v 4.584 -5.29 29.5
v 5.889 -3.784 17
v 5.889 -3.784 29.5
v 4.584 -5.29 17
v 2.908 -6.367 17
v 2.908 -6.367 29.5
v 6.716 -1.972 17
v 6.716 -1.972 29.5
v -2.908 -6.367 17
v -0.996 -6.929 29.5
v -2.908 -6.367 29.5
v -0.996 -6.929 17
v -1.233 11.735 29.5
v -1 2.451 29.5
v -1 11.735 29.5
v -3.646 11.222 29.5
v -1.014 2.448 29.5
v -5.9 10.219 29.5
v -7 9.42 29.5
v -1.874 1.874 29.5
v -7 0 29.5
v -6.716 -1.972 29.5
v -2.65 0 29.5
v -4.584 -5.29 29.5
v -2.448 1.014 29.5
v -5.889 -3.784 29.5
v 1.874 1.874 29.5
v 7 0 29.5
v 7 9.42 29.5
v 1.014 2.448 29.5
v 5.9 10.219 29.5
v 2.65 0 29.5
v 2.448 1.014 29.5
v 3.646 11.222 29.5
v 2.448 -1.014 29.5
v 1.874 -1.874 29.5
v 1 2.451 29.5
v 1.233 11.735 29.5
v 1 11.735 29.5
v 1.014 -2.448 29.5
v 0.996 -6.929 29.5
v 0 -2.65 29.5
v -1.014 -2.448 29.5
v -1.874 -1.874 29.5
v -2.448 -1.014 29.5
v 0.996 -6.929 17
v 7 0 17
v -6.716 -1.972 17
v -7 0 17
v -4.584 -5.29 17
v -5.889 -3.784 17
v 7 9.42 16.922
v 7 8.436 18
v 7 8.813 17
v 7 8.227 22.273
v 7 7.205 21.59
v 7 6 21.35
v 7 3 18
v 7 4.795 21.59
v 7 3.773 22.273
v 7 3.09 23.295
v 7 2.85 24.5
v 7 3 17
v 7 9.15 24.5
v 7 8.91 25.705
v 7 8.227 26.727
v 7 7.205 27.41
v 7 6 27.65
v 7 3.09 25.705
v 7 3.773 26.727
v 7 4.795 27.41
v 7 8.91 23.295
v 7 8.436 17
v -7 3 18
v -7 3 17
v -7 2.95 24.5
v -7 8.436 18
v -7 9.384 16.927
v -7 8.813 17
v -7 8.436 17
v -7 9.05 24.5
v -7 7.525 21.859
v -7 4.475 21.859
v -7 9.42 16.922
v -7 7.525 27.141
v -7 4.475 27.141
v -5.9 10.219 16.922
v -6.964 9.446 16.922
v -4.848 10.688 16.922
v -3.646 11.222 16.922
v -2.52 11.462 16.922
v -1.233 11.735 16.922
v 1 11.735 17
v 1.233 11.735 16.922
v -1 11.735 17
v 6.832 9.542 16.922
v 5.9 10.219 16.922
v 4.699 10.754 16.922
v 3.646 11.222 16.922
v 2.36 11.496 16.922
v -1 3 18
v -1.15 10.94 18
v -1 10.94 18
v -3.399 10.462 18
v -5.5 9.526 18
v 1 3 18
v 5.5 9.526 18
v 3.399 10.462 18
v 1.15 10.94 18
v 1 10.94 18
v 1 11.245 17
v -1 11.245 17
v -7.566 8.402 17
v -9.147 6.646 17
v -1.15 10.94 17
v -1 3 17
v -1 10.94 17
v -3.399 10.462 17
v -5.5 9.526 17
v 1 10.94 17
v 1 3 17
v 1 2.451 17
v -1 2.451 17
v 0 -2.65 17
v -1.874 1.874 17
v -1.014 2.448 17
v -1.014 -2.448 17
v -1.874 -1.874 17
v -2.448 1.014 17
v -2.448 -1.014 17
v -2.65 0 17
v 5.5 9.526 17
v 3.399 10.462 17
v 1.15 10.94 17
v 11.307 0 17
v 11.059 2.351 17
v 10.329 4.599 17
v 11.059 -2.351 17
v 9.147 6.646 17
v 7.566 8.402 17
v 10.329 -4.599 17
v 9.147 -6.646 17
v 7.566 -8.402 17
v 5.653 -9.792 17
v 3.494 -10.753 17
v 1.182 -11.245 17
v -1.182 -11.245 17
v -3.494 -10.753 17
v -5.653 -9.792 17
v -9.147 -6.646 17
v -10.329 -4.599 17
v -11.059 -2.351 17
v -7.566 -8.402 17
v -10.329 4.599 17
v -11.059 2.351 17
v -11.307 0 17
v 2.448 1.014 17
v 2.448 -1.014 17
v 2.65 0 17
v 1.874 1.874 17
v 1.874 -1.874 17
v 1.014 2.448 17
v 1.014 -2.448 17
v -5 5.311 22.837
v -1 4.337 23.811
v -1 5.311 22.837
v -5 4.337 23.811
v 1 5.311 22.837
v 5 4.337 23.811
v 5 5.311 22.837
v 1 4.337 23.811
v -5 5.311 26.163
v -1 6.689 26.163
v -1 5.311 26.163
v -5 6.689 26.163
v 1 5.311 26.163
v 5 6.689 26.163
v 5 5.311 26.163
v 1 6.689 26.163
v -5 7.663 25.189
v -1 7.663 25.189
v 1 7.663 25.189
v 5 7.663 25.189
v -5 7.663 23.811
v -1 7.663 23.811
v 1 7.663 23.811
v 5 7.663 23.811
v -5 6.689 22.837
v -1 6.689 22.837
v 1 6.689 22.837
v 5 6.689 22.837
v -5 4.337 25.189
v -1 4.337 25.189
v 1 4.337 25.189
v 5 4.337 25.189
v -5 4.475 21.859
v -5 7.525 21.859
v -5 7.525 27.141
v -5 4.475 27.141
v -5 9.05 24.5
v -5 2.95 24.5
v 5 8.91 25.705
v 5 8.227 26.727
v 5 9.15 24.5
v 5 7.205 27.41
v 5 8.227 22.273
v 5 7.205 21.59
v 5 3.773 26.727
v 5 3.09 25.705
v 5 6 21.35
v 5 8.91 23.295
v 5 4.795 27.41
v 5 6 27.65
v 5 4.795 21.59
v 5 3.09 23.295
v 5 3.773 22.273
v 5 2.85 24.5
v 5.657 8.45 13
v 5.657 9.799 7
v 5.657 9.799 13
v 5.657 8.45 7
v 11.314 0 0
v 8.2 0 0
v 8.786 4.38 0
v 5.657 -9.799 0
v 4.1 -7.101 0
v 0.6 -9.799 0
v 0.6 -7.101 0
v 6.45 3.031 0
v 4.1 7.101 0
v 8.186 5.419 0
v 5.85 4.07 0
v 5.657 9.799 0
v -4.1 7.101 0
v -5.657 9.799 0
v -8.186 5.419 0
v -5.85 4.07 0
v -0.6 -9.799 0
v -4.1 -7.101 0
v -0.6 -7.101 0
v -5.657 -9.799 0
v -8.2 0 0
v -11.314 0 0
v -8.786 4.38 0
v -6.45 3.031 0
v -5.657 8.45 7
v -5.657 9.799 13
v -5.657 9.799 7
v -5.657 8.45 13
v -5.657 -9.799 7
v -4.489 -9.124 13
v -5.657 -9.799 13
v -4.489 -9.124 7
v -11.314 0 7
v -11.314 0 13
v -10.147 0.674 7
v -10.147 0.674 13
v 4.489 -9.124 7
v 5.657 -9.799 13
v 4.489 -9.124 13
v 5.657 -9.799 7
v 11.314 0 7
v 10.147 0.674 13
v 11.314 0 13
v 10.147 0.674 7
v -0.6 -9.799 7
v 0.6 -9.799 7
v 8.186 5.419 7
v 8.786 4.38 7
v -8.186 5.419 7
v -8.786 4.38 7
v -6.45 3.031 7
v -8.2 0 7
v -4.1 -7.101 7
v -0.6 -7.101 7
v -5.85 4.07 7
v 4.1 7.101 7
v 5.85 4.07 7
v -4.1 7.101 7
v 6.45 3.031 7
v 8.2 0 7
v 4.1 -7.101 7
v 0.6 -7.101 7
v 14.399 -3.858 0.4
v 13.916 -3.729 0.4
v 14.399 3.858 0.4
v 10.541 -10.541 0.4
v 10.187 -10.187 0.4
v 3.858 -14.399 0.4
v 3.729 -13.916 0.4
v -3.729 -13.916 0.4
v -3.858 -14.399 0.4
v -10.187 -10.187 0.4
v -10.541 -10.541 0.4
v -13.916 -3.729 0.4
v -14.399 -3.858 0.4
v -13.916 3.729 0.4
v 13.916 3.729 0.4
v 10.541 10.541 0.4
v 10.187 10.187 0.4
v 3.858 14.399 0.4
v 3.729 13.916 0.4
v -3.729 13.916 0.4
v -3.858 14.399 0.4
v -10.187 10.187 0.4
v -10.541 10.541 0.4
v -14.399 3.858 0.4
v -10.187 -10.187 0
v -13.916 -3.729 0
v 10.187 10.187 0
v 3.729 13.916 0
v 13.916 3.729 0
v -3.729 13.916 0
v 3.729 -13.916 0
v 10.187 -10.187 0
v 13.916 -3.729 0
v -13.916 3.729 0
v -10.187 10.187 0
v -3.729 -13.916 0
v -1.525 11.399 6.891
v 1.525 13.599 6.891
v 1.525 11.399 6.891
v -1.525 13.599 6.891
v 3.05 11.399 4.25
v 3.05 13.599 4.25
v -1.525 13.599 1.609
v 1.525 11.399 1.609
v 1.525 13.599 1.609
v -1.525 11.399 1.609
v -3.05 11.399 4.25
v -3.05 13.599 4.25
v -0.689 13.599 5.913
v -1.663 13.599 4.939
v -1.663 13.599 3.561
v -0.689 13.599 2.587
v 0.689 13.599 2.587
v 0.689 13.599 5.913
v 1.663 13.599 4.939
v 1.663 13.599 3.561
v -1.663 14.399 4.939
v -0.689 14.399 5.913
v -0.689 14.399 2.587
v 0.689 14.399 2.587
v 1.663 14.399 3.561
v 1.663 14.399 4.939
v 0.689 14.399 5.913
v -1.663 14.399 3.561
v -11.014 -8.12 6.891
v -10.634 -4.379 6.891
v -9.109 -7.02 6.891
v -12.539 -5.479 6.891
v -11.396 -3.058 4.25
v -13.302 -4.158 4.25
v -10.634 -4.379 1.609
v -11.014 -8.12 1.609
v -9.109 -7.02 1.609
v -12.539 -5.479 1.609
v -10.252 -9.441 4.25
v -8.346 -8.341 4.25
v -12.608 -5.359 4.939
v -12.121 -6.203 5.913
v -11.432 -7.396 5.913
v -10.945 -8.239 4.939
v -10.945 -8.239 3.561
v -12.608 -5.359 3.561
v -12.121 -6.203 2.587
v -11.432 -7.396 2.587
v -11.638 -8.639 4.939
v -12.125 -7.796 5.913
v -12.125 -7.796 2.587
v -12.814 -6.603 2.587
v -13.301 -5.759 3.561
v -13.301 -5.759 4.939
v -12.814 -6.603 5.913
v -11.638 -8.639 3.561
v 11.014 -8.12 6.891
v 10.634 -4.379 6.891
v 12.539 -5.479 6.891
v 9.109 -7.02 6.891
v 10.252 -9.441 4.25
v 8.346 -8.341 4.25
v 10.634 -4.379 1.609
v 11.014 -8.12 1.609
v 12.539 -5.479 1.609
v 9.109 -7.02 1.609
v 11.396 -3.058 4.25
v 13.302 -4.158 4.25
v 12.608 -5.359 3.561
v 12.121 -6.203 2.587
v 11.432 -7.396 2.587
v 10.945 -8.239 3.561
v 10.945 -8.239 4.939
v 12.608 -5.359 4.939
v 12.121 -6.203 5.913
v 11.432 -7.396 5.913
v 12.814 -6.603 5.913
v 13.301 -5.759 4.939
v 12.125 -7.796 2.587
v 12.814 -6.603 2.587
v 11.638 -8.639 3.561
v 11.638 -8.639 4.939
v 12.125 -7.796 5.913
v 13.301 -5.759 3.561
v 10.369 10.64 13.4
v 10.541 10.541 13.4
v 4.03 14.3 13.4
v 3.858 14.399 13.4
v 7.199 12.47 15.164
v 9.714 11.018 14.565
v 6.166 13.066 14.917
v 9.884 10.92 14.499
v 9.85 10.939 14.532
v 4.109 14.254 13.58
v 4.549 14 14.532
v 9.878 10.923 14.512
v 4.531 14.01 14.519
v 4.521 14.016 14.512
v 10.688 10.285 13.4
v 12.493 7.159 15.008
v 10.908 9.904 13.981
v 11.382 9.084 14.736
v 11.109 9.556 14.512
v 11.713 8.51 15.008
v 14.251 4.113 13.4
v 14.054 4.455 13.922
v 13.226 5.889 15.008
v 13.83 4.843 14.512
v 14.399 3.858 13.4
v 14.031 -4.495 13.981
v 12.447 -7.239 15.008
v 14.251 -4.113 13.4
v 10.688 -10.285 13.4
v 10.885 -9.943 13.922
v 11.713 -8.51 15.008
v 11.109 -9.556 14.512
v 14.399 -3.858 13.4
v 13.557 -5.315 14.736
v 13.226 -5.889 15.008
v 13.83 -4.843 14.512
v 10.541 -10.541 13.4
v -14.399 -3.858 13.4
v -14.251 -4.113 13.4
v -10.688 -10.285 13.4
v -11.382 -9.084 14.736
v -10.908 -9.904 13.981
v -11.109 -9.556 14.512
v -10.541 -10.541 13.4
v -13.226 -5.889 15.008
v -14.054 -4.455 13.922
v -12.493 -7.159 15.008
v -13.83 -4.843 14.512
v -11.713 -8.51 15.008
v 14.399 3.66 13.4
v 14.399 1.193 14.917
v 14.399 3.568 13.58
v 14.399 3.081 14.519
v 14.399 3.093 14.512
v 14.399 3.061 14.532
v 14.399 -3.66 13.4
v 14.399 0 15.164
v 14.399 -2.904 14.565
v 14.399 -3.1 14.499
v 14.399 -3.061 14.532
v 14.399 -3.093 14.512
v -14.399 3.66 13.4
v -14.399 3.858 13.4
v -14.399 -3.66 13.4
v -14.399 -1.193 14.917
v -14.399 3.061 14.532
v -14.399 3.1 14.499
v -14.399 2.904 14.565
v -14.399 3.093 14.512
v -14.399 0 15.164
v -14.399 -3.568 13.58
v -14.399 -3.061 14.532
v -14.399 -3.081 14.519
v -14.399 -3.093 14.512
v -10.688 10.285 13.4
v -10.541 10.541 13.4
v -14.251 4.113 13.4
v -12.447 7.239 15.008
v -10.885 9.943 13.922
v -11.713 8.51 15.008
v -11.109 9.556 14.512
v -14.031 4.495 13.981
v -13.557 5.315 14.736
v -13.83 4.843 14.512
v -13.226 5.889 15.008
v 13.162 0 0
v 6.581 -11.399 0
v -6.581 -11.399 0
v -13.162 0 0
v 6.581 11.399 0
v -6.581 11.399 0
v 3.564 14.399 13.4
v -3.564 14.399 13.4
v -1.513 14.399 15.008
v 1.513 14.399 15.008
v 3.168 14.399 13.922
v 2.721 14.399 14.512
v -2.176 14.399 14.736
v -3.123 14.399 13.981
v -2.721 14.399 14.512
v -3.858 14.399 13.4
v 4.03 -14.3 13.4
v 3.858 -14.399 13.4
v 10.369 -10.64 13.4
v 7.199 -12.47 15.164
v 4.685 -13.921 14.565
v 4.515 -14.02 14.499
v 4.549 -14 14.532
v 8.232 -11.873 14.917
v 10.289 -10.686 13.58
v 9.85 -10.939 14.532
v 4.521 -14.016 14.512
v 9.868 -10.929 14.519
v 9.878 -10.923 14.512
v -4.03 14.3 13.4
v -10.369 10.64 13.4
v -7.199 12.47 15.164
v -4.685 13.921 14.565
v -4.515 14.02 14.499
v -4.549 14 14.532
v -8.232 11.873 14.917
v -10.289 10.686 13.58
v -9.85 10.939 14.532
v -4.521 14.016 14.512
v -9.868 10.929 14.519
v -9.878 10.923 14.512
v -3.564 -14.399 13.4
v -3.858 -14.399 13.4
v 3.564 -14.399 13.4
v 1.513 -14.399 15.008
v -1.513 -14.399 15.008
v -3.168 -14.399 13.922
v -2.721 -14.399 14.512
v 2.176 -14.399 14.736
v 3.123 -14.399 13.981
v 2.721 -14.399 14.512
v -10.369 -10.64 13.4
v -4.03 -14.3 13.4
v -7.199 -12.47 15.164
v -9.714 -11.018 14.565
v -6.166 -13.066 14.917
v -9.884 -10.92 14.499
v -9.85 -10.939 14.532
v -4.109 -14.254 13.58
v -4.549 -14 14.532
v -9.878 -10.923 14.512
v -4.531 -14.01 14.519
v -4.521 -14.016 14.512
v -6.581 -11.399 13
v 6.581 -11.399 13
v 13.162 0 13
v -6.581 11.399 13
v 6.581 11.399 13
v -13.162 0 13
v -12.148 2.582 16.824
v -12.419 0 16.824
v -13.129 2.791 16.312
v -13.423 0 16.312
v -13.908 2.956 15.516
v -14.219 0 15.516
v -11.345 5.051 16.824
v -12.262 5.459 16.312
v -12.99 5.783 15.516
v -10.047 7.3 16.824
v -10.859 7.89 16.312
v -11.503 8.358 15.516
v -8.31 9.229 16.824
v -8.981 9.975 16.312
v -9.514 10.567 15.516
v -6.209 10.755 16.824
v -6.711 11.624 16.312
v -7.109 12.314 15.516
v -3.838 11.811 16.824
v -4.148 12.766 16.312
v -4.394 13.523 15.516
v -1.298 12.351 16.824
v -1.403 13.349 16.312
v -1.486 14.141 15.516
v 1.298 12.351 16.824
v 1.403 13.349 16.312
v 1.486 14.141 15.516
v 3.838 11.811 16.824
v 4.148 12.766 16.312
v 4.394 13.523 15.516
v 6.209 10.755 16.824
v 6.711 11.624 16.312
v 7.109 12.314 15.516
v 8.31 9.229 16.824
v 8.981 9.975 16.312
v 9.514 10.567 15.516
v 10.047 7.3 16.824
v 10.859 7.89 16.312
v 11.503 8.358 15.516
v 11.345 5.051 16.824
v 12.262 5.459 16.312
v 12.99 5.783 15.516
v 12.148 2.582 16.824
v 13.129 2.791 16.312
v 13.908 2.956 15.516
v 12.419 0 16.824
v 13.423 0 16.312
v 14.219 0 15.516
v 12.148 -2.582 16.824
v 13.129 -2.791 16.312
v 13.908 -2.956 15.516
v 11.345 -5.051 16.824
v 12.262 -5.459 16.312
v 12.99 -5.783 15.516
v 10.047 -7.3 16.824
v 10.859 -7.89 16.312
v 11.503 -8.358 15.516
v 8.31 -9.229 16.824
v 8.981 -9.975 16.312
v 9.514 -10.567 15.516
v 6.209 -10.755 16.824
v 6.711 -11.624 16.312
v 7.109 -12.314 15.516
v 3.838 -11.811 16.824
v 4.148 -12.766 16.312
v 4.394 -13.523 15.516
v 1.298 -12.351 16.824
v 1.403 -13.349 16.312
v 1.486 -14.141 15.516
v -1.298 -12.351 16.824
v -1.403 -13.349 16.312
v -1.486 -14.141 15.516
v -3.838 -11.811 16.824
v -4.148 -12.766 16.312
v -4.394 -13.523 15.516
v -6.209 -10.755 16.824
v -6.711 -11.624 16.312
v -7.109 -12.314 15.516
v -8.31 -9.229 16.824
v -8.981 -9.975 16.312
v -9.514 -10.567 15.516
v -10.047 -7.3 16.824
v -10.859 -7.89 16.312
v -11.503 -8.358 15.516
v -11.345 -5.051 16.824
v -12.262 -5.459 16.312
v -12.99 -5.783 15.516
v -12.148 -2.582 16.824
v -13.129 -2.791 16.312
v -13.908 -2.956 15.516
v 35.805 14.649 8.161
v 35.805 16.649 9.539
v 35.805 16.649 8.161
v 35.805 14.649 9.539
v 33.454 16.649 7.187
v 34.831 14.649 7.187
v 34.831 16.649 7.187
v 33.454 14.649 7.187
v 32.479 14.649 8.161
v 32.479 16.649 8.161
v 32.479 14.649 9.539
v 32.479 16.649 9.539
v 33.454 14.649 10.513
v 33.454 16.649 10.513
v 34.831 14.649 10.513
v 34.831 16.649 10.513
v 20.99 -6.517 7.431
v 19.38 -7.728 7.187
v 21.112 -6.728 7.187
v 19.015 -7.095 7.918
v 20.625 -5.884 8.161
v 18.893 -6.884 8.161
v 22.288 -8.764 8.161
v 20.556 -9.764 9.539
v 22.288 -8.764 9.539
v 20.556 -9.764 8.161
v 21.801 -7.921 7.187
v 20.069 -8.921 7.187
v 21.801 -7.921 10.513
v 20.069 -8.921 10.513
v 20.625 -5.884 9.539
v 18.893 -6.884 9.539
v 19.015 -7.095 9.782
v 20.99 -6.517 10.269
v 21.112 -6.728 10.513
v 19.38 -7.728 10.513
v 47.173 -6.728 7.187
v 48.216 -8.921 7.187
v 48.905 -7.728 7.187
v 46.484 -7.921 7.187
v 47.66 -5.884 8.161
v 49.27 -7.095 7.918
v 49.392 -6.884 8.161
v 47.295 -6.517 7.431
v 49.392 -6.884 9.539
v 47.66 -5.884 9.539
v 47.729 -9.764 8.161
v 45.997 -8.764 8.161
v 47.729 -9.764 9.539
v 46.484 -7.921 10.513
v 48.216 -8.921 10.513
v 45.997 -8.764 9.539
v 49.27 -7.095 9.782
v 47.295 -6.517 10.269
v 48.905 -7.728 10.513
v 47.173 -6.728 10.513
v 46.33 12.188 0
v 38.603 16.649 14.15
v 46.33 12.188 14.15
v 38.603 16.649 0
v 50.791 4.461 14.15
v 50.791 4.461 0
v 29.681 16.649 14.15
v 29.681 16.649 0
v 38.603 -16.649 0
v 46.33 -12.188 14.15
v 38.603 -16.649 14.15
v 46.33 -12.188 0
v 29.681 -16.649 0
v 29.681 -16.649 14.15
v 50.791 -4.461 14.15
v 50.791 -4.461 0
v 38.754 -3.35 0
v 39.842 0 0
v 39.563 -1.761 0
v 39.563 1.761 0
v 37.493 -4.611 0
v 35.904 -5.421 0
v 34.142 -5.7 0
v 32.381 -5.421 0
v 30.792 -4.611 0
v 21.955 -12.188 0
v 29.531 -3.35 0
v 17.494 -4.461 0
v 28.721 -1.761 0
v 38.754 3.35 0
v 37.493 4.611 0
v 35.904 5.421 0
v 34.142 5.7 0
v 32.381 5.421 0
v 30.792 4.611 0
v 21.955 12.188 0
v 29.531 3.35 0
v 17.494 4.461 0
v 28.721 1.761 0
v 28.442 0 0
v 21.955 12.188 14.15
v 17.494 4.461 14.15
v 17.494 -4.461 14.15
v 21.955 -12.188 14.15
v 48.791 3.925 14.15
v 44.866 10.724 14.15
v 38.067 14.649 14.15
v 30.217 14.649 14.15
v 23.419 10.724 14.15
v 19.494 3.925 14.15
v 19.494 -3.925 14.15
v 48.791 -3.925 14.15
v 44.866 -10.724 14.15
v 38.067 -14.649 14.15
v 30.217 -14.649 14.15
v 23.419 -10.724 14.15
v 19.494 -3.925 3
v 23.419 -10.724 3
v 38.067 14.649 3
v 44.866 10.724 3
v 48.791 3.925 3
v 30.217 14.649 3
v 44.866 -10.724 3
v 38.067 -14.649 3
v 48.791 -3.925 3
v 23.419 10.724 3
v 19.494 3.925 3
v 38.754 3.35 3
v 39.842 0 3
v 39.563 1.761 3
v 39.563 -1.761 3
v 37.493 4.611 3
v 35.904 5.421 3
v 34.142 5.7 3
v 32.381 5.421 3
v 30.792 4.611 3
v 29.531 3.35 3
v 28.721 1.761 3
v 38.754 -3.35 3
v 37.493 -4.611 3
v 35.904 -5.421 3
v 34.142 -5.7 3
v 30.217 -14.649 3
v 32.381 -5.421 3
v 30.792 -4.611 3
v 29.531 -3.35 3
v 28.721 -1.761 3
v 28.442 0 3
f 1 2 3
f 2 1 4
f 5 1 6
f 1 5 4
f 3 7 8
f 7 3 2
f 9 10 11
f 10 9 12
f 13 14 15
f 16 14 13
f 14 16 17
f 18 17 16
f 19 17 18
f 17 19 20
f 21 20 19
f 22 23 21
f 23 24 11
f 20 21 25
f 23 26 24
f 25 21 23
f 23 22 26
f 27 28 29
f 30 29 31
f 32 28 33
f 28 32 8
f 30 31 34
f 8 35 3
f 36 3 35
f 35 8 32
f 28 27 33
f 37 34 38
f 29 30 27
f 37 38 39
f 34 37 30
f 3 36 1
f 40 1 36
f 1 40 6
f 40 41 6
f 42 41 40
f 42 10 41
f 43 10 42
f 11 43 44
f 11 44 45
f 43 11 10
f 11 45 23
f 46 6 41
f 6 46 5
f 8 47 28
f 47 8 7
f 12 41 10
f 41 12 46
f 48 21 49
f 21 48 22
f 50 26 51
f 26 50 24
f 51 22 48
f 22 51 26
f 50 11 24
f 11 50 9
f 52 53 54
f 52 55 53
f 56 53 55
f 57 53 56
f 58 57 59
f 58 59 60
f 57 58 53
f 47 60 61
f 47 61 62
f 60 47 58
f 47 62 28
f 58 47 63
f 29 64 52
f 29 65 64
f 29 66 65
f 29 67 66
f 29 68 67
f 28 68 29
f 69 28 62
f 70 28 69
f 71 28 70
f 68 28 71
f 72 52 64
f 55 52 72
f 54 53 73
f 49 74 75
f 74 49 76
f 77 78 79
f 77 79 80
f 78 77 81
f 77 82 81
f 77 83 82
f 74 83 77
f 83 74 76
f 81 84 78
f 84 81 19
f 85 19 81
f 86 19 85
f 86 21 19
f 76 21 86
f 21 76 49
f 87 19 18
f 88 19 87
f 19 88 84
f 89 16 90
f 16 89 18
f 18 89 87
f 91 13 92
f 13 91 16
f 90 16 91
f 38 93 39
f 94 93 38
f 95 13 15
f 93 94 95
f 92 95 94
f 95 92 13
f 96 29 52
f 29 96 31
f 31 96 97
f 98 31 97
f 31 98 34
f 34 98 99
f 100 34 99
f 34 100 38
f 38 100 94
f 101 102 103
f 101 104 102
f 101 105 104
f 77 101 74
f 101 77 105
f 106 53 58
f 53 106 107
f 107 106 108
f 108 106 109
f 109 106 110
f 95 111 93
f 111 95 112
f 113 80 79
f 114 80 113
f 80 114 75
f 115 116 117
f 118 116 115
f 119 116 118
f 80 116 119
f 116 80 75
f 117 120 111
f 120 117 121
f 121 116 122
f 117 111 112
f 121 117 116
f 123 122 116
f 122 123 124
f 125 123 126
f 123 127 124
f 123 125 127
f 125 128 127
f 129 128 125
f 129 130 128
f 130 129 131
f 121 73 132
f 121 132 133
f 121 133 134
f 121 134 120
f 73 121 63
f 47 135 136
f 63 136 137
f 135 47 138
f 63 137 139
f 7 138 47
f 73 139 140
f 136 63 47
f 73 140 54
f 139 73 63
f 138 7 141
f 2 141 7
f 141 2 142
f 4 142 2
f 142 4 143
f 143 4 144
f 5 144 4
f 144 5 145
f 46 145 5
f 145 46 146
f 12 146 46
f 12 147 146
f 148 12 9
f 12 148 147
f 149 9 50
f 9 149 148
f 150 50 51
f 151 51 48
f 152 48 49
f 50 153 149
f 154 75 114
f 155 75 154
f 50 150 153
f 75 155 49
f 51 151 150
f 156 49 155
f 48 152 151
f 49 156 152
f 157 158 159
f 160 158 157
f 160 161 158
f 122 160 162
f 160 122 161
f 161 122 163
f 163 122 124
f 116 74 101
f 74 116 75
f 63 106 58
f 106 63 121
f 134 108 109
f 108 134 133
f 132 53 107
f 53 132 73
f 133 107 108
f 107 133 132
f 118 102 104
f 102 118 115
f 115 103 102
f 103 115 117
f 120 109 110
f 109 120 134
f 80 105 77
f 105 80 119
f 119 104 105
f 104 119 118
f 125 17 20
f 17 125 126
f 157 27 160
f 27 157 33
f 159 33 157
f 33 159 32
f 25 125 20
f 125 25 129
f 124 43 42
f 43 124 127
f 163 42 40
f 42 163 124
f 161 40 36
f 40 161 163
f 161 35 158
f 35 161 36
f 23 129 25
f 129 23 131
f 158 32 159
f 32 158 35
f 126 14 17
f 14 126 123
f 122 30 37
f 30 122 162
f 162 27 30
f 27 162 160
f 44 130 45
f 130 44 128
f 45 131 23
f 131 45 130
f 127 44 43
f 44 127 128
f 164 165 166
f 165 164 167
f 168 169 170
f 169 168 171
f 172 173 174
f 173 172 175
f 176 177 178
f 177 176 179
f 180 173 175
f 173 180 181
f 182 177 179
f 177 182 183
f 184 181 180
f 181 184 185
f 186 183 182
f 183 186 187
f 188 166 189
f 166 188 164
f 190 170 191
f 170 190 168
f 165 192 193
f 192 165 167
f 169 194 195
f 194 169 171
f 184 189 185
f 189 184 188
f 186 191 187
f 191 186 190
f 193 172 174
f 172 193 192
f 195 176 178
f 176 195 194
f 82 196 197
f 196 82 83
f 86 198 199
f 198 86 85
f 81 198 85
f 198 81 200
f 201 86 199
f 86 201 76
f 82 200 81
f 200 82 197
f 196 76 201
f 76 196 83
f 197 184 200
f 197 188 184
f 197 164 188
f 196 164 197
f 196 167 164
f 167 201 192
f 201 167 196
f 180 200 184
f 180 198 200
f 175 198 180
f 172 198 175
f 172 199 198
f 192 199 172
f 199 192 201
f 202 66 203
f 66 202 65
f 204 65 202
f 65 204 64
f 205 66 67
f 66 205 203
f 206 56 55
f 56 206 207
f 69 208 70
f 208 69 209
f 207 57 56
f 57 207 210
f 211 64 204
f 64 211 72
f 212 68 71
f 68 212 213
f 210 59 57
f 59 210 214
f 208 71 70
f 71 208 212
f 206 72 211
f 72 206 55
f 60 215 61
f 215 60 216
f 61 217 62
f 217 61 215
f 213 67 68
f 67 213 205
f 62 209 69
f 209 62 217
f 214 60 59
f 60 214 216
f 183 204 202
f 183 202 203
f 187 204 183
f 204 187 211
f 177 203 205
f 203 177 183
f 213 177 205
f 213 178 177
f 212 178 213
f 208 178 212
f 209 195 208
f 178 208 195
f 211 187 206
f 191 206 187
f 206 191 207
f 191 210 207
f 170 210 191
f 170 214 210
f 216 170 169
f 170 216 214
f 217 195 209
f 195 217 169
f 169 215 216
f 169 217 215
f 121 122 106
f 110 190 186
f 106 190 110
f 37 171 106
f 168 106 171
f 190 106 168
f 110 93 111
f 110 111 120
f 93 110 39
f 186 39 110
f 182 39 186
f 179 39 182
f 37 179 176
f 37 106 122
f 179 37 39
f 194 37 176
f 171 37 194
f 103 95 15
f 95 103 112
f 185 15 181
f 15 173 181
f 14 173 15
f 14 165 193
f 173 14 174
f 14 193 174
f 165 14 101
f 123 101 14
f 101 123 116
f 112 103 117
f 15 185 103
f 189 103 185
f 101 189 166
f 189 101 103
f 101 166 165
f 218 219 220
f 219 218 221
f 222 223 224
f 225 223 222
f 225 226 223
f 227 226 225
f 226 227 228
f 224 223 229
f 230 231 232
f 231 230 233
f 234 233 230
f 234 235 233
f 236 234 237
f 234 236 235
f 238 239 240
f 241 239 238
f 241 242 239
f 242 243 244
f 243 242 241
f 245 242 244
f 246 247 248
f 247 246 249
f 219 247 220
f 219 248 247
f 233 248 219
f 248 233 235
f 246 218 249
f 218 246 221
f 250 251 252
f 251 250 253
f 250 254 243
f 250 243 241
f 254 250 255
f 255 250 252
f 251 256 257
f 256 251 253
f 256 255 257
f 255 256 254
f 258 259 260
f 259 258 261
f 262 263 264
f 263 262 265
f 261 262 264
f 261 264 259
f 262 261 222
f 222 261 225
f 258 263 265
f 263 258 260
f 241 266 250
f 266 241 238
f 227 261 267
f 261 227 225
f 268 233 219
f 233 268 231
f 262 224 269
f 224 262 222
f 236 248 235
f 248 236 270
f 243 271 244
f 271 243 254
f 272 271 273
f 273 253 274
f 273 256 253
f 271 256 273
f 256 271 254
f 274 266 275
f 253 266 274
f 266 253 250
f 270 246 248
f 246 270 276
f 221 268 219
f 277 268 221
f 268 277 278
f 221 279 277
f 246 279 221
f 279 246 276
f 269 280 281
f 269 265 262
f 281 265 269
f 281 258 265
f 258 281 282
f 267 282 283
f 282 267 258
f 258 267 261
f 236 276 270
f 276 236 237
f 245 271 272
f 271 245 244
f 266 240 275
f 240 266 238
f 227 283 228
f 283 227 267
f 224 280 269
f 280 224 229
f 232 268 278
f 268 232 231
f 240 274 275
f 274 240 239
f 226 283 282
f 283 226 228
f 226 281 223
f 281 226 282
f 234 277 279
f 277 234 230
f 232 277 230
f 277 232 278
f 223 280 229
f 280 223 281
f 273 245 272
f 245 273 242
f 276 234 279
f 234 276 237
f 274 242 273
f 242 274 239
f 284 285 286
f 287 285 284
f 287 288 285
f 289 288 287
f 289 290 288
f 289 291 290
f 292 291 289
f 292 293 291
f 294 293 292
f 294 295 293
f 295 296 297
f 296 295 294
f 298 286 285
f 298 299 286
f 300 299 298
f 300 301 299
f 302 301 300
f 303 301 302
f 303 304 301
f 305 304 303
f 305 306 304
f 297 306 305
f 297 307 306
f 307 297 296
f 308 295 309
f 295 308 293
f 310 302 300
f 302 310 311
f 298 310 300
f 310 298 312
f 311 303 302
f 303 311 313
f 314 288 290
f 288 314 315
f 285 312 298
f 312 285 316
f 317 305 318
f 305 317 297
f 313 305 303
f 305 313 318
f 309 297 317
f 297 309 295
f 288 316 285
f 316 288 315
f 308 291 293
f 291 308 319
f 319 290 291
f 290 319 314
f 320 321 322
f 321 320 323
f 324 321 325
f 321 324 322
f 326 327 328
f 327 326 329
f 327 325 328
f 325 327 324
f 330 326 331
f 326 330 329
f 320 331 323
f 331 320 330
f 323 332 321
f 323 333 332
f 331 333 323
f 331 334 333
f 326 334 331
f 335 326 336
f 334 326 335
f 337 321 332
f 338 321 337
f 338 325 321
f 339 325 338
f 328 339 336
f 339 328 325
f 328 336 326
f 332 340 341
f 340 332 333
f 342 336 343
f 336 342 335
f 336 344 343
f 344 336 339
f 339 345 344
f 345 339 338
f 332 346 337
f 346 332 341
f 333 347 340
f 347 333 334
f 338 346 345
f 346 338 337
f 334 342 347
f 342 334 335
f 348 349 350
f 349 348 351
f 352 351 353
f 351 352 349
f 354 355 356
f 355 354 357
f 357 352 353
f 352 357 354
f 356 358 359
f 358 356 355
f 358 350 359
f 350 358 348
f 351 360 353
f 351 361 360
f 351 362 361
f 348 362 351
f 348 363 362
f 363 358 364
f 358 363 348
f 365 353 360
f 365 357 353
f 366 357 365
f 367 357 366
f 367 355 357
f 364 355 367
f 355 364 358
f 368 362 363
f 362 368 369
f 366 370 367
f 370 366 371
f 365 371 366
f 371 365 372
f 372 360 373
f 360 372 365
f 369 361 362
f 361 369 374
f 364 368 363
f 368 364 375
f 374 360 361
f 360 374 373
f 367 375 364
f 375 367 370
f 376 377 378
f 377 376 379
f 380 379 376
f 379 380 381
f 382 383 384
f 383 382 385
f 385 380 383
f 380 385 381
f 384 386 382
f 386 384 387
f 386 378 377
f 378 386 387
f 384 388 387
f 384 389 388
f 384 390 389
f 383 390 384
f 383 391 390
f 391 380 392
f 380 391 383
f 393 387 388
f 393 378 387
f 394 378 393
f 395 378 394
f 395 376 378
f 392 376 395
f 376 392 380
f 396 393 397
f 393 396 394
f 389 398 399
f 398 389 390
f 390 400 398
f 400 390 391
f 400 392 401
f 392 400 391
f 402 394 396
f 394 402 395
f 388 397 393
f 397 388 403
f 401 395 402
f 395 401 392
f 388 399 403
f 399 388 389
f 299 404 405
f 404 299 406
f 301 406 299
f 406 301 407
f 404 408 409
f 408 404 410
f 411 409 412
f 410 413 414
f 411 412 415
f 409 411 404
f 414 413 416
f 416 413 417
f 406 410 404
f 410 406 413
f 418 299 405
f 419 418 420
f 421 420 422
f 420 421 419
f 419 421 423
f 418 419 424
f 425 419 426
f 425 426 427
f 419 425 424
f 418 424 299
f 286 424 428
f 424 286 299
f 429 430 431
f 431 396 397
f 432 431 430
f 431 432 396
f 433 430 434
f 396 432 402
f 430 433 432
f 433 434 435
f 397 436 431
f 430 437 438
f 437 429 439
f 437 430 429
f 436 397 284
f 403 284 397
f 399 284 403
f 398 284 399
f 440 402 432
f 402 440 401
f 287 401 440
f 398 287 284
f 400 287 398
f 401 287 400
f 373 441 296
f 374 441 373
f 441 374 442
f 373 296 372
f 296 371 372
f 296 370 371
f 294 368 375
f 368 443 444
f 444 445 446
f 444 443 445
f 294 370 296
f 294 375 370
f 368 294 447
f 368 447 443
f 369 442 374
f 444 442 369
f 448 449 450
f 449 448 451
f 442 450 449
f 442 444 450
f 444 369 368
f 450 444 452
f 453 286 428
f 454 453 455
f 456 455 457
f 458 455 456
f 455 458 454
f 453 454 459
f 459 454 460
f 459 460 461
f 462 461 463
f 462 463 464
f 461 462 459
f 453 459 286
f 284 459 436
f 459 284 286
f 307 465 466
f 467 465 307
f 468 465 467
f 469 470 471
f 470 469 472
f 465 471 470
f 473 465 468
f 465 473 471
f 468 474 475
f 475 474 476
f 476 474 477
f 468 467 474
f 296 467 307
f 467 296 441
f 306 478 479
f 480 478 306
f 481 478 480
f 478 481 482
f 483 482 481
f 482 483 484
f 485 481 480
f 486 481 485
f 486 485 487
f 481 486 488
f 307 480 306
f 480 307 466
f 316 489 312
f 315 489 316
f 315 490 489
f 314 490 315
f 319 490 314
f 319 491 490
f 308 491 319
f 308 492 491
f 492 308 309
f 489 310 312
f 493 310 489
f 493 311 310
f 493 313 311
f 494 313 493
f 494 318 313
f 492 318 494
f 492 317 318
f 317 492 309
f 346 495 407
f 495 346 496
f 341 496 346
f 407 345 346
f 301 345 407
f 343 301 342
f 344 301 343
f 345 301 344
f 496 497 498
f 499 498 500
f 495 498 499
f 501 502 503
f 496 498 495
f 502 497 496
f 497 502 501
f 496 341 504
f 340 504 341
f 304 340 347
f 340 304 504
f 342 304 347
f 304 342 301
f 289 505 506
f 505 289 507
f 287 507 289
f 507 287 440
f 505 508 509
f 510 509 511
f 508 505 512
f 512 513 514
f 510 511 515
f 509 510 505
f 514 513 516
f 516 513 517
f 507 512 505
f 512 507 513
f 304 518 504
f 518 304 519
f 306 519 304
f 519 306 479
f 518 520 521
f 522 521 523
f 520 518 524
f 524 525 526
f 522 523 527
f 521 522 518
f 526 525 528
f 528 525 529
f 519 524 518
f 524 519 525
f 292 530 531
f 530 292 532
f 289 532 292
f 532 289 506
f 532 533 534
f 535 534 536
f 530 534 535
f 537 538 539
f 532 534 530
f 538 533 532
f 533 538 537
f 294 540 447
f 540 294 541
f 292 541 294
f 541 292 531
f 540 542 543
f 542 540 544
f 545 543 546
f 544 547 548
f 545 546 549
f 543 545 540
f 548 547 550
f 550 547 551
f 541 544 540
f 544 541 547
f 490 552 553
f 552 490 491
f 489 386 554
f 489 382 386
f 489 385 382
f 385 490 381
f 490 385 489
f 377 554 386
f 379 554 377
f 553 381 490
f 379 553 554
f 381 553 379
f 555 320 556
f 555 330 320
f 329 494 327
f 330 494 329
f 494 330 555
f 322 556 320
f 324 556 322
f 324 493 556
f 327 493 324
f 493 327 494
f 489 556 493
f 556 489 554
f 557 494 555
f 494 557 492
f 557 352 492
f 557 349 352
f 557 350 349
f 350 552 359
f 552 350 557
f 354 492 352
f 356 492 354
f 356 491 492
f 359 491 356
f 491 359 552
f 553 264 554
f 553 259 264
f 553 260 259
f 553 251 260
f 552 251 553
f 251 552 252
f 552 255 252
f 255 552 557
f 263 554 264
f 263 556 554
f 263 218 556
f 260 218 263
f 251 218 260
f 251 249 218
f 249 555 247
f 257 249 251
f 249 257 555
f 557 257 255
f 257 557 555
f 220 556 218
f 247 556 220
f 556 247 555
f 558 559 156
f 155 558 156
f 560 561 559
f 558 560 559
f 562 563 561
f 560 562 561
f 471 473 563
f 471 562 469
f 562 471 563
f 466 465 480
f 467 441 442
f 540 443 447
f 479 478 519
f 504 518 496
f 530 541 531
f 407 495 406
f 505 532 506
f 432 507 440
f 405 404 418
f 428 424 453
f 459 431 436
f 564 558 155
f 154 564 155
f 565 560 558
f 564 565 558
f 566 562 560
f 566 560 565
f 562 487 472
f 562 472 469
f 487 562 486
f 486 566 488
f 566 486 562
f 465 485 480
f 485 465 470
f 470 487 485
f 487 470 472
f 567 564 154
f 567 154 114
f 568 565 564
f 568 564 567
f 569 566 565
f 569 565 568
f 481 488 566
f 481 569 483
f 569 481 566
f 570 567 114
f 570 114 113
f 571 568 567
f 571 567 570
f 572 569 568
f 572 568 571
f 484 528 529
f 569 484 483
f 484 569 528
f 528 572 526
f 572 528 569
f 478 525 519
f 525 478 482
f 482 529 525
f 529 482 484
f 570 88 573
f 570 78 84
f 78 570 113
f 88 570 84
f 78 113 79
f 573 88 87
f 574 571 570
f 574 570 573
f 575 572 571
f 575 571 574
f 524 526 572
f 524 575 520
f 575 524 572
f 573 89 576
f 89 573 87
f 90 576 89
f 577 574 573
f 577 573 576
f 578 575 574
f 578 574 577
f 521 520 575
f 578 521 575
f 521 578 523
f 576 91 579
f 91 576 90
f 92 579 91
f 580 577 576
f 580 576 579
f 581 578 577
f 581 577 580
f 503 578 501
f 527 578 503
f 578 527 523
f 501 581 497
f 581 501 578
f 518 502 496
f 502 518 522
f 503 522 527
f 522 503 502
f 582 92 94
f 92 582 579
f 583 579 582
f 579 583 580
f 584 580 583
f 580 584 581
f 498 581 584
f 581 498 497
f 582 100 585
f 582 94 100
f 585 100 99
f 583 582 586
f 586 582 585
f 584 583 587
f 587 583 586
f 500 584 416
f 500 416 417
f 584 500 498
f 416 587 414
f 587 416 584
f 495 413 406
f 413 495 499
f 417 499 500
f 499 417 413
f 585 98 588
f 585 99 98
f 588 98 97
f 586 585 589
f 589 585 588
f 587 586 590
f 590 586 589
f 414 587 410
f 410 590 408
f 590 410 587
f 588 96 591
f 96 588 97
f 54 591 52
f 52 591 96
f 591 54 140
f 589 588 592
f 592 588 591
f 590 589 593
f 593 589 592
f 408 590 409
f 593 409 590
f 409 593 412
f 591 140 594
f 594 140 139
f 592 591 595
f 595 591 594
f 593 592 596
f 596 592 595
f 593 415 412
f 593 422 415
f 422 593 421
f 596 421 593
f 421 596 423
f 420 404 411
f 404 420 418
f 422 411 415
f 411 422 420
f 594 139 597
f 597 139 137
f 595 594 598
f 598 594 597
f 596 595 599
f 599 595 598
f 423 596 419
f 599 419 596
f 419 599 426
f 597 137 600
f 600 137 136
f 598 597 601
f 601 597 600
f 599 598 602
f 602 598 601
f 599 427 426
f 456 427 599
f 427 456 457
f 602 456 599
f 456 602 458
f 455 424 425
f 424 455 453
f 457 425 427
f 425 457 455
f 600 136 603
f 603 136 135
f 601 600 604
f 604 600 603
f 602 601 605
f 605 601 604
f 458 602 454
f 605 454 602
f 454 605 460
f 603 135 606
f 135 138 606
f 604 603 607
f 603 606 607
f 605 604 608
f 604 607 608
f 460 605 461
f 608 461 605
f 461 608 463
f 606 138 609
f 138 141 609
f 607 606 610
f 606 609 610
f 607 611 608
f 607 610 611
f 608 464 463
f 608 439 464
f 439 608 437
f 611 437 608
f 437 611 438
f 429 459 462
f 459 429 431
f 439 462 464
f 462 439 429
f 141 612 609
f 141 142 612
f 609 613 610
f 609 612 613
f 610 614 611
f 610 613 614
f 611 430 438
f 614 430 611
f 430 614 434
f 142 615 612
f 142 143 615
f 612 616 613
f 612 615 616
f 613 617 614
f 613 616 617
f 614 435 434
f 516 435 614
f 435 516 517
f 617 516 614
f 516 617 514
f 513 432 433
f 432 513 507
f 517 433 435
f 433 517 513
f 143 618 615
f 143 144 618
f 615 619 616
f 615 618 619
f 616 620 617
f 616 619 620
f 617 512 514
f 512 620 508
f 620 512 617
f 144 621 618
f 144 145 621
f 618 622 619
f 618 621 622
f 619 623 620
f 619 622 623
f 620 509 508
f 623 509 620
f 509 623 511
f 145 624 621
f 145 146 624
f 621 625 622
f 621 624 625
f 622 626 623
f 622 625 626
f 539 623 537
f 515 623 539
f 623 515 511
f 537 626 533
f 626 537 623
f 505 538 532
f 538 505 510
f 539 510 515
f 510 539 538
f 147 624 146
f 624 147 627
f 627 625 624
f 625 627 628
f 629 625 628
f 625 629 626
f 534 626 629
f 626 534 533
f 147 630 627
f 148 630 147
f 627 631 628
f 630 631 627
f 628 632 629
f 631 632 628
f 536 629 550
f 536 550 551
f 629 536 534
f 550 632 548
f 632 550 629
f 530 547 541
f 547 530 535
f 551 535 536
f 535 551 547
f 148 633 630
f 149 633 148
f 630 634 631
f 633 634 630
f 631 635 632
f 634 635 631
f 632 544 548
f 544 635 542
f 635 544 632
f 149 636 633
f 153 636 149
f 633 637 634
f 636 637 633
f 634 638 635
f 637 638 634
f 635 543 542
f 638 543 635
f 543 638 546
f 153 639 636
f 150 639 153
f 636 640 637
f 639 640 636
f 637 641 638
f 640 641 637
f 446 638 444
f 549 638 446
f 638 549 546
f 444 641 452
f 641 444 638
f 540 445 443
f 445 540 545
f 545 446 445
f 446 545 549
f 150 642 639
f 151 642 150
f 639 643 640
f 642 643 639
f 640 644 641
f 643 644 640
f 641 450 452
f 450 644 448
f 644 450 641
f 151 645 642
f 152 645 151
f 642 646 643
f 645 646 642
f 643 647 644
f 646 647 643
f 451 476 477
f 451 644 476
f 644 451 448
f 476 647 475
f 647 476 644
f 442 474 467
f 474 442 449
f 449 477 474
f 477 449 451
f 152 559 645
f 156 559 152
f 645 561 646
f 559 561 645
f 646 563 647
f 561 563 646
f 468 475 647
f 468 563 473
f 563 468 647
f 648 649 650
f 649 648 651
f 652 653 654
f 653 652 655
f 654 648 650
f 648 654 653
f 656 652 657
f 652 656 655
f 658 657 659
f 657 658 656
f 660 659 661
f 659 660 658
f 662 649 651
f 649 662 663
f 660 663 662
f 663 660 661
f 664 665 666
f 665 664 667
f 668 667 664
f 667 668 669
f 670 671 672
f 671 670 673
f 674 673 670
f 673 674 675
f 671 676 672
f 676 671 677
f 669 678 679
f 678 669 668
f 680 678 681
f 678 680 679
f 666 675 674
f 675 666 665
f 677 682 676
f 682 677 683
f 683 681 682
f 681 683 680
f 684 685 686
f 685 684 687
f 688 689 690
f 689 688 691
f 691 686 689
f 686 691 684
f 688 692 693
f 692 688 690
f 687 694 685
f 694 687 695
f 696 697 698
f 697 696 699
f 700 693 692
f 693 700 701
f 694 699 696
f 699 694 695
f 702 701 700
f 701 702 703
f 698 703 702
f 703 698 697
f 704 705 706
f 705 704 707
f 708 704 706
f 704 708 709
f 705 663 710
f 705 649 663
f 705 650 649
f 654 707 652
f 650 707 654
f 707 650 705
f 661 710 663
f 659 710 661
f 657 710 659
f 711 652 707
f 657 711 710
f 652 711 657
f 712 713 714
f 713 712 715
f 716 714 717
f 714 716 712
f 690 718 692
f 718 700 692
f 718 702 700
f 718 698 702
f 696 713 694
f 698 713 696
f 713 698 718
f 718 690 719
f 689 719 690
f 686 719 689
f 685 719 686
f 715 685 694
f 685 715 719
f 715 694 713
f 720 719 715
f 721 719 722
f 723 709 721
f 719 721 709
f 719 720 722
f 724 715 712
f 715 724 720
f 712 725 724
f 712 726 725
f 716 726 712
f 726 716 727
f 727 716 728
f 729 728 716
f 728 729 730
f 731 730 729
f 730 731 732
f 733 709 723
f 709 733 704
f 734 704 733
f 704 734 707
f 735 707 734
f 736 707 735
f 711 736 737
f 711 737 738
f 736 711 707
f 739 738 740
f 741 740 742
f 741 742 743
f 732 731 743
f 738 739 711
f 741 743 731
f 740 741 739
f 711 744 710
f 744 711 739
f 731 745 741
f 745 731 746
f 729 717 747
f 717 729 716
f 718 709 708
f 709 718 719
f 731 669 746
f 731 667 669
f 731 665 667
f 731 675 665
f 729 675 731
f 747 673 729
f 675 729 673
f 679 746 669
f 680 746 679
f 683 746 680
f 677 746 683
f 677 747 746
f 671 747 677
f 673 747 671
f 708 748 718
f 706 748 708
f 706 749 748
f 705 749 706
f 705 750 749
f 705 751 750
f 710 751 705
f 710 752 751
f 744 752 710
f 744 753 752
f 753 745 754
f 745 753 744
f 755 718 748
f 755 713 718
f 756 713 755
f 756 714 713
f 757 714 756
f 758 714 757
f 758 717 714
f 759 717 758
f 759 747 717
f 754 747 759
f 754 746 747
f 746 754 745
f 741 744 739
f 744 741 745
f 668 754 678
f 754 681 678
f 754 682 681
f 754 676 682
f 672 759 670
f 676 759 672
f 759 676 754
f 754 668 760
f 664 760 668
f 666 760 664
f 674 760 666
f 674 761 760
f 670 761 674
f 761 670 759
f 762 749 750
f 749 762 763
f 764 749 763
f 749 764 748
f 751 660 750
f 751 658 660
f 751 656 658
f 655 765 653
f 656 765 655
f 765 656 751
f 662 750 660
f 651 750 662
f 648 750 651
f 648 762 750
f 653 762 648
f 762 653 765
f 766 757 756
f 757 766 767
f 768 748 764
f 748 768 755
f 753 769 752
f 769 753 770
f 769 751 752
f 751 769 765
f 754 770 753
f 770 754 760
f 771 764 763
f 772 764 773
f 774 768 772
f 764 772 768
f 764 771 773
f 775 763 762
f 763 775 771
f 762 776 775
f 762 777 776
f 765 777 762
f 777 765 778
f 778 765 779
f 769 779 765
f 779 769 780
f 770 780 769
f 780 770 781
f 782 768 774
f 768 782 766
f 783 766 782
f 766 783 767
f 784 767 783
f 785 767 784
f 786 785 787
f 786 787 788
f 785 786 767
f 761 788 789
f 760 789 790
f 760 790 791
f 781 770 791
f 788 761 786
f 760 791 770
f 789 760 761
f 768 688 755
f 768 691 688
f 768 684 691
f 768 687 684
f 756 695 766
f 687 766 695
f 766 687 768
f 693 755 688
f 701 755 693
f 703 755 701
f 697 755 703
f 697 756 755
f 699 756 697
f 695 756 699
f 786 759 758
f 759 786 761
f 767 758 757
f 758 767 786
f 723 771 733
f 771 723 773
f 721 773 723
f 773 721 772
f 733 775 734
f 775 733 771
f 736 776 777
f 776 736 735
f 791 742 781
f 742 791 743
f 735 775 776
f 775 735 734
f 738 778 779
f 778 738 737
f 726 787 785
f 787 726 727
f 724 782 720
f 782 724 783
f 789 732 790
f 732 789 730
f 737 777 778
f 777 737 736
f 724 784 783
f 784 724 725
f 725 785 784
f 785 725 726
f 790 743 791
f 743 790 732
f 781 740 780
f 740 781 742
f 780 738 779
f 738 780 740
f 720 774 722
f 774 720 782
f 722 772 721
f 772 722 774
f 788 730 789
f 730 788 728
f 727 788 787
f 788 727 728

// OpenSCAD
// file: functions.scad
// PRUSA Mendel  
// Functions used in many files
// GNU GPL v2
// Josef Průša
// josefprusa@me.com
// prusadjs.cz
// http://www.reprap.org/wiki/Prusa_Mendel
// http://github.com/prusajr/PrusaMendel

module nut(d,h,horizontal=true){
cornerdiameter =  (d / 2) / cos (180 / 6);
cylinder(h = h, r = cornerdiameter, $fn = 6);
if(horizontal){
for(i = [1:6]){
	rotate([0,0,60*i]) translate([-cornerdiameter-0.2,0,0]) rotate([0,0,-45]) cube(size = [2,2,h]);
}}
}

// By nophead
module polyhole(d,h) {
    n = max(round(2 * d),3);
    rotate([0,0,180])
        cylinder(h = h, r = (d / 2) / cos (180 / n), $fn = n);
}




module roundcorner(diameter){
	difference(){
		cube(size = [diameter,diameter,99], center = false);
		translate(v = [diameter, diameter, 0]) cylinder(h = 100, r=diameter, center=true);
	}
}
// file: metric.scad
// PRUSA Mendel  
// Default metric sizes
// GNU GPL v2
// Josef Průša
// josefprusa@me.com
// prusadjs.cz
// http://www.reprap.org/wiki/Prusa_Mendel
// http://github.com/prusajr/PrusaMendel

// DONT CHANGE THIS FILE! ALTER VALUES IN CONFIGURATION.SCAD INSTEAD

// RODS

threaded_rod_diameter = 8.2;
threaded_rod_diameter_horizontal = 8.2;
smooth_bar_diameter = 8;
smooth_bar_diameter_horizontal = 8.5;

// Nuts and bolts

m8_diameter = 9;
m8_nut_diameter = 16.4;

m4_diameter = 4.5;
m4_nut_diameter = 9;

m3_diameter = 3.6;
m3_nut_diameter = 6.1;
m3_nut_diameter_horizontal = 6.1;

// Bushing holder

bushing_core_diameter = smooth_bar_diameter;
bushing_material_thickness = 1;

// Motors

motor_shaft = 5.5;
// file: configuration.scad
// PRUSA Mendel  
// Configuration file
// GNU GPL v2
// Josef Průša
// josefprusa@me.com
// prusadjs.cz
// http://www.reprap.org/wiki/Prusa_Mendel
// http://github.com/prusajr/PrusaMendel

// PLEASE SELECT ONE OF THE CONFIGURATIONS BELOW
// BY UN-COMMENTING IT

// Uncomment for metric settings
// METRIC METRIC METRIC METRIC METRIC METRIC METRIC METRIC 

include <metric.scad>;

// Uncomment for imperial settings
// IMPERIAL IMPERIAL IMPERIAL IMPERIAL IMPERIAL IMPERIAL IMPERIAL 

//include <sae.scad>;

// CUSTOM CUSTOM CUSTOM CUSTOM CUSTOM CUSTOM CUSTOM CUSTOM CUSTOM

thin_wall = 3;

// LM8UU
linear = false;


// CHANGE ONLY THE STUFF YOU KNOW
// IT WILL REPLACE DEFAULT SETTING

// RODS

// threaded_rod_diameter = 0;
// threaded_rod_diameter_horizontal = 0;
// smooth_bar_díameter = 0;
// smooth_bar_díameter_horizontal = 0;

// Nuts and bolts

// m8_diameter = 0;
// m8_nut_diameter = 0;

// m4_diameter = 0;
// m4_nut_diameter = 0;

// m3_diameter = 0;
// m3_nut_diameter = 0;

// Bushing holder

// bushing_core_diameter = smooth_bar_díameter;
// bushing_material_thickness = 0;


///counted stuff
m3_nut_diameter_bigger = ((m3_nut_diameter  / 2) / cos (180 / 6))*2;

// functions 
include <functions.scad>
// main file
// PRUSA Mendel  
// motor/leadscrew coupling
// Used for connecting motor to leadscrew
// GNU GPL v2
// Gregs New Z Coupling.
include <configuration.scad>

/**
 * @name Coupling
 * @category Printed
 */

m8_nut_height=7; 
washer_diameter=19.5;
washer_thickness=1.6;
max_adjustment=1.2;

m8_nut_flat_to_flat=m8_nut_diameter*cos(30);
m8_overlap=m8_nut_diameter-m8_nut_flat_to_flat+0.5;
flange_diameter=(m8_nut_diameter*cos(30)+m8_overlap*2)/cos(30);

surround_thickness=3;
surround_nut_trap=2.2;
surround_nut_height=m3_nut_diameter/2+1.2;
surround_inner_d=(flange_diameter*cos(30)+max_adjustment+2)/cos(30);
surround_outer_d=(surround_inner_d*cos(30)+2*surround_thickness)/cos(15);
surround_height=2*m8_nut_height+surround_thickness;
surround_bevel_radius=surround_thickness*1.2;

cup_base_thickness=3;
cup_clearance=0.25;
cup_walls=2;
cup_inner_diameter=(surround_outer_d*cos(15)+2*cup_clearance)/cos(15);
cup_outer_diameter=(cup_inner_diameter*cos(15)+cup_walls*2)/cos(15);
cup_height=cup_base_thickness+washer_thickness+surround_nut_height+m3_diameter/2+3.5;

coupling();
translate([cup_outer_diameter/2+surround_outer_d/2+2,0,0])
coupling_cup ();

module coupling_cup()
{
	difference()
	{
		rotate(180/12)
		cylinder(r=cup_outer_diameter/2,h=cup_height,$fn=12);
		rotate(180/12)
		translate([0,0,cup_base_thickness])
		cylinder(r=cup_inner_diameter/2,h=cup_height-cup_base_thickness+1,$fn=12);

		for (i=[0:2])
		rotate(i*120)
		rotate([-90,0,0])
		translate([0,-surround_nut_height-cup_base_thickness-washer_thickness,cup_inner_diameter/2*cos(15)-1])
		{
			rotate(180/8)
			cylinder(r=m3_diameter/2,h=cup_walls+2,$fn=8);
		}

		translate([0,0,-1])
		cylinder(r=m8_diameter/2+max_adjustment,h=cup_base_thickness+2,$fn=20);
	}
}

module coupling()
{
	difference ()
	{
		translate([0,0,surround_height])
		render()
		intersection ()
		{
			translate([0,0,-3])
			union()
			{
				cylinder(h = 15.5, r=7);
				translate(v = [0, 6, 6.25]) cube(size = [14,12,18.5], center = true);
			}
			translate([0,0,-1])
			cylinder(r=11.8,h=32);
		}

		// inside diameter
		translate(v = [0, 0, surround_height])cylinder(h = 16, r=motor_shaft/2-0.1, $fn=16);
		
		// screw holes
		rotate ([0,0,90]) translate(v = [6, 15, 7.5+surround_height]) rotate ([90,0,0]) 
		rotate(360/16)
		cylinder(h = 30, r=m3_diameter/2, $fn=8);
		rotate ([0,0,90]) translate(v = [6, 12-2, 7.5+surround_height]) rotate ([90,0,0]) 
		cylinder(h = 5, r=m3_nut_diameter/2, $fn=6);
		rotate ([0,0,90]) translate(v = [6, 12-14-5+2, 7.5+surround_height]) rotate ([90,0,0]) 
		cylinder(h = 5, r=m3_nut_diameter/2+0.1, $fn=16);

		//main cut
		translate(v = [0, 10, 8+surround_height]) cube(size = [2,20,16], center = true);
		
		//difference cut
		render()intersection ()
		{
			translate(v = [0, 7, surround_height + 0.5])  cube(size = [20,8,1], center = true);
			translate([0,0,surround_height-0.5])
			cylinder(r=11,h=3);
		}
	}

	// The support around the bottom nut.
	
	difference ()
	{
		union ()
		{
			cylinder(r=flange_diameter/2, h=m8_nut_height,$fn=6);		
			for (i=[0:2])
			rotate(120*i)
			{
				translate([-flange_diameter/2*sin(30),flange_diameter*cos(30)/2-m8_overlap/2,0])
				cube([flange_diameter*sin(30),m8_overlap/2,2*m8_nut_height+1]);
			}
		}
		translate([0,0,-1])
		cylinder(r=m8_nut_diameter/2,h=m8_nut_height+2,$fn=6);		


		for (i=[0:2])
		rotate(120*i+60)
		{
			translate([-max_adjustment/2,0,-1])
			cube([max_adjustment,flange_diameter*cos(30)/2+1,m8_nut_height+2]);
		}
	}	

	// The surround.

	difference ()
	{
		rotate(180/12)
		cylinder (r=surround_outer_d/2,h=surround_height,$fn=12);
	
		//bevel the bottom so it fits in the cup without cleanup.

		rotate(180/12)
		render () difference ()
		{
			translate([0,0,-1])
			cylinder (r=surround_outer_d/2+1,h=0.4 + 1,$fn=12);
			translate([0,0,-2])
			cylinder (r=surround_outer_d/2-0.5,h=0.4 + 1 + 2,$fn=12);
		}

		translate([0,0,-1])
		cylinder (r=surround_inner_d/2,h=2*m8_nut_height,$fn=6);

		for (i=[0:2])
		rotate(i*120)
		rotate([-90,0,0])
		translate([0,-surround_nut_height,surround_inner_d/2*cos(30)-1])
		{
			cylinder(r=m3_nut_diameter/2,h=surround_nut_trap+1,$fn=6);
			rotate(180/8)
			cylinder(r=m3_diameter/2,h=surround_thickness+2,$fn=8);
		}

		translate([0,0,surround_height-surround_bevel_radius])
		rotate_extrude ()
		{
			translate([surround_outer_d/2-surround_bevel_radius,0])
			difference()
			{
			square([surround_bevel_radius+1,surround_bevel_radius+1]);
			circle(r=surround_bevel_radius,$fn=20);
			}
		}
	}
}
